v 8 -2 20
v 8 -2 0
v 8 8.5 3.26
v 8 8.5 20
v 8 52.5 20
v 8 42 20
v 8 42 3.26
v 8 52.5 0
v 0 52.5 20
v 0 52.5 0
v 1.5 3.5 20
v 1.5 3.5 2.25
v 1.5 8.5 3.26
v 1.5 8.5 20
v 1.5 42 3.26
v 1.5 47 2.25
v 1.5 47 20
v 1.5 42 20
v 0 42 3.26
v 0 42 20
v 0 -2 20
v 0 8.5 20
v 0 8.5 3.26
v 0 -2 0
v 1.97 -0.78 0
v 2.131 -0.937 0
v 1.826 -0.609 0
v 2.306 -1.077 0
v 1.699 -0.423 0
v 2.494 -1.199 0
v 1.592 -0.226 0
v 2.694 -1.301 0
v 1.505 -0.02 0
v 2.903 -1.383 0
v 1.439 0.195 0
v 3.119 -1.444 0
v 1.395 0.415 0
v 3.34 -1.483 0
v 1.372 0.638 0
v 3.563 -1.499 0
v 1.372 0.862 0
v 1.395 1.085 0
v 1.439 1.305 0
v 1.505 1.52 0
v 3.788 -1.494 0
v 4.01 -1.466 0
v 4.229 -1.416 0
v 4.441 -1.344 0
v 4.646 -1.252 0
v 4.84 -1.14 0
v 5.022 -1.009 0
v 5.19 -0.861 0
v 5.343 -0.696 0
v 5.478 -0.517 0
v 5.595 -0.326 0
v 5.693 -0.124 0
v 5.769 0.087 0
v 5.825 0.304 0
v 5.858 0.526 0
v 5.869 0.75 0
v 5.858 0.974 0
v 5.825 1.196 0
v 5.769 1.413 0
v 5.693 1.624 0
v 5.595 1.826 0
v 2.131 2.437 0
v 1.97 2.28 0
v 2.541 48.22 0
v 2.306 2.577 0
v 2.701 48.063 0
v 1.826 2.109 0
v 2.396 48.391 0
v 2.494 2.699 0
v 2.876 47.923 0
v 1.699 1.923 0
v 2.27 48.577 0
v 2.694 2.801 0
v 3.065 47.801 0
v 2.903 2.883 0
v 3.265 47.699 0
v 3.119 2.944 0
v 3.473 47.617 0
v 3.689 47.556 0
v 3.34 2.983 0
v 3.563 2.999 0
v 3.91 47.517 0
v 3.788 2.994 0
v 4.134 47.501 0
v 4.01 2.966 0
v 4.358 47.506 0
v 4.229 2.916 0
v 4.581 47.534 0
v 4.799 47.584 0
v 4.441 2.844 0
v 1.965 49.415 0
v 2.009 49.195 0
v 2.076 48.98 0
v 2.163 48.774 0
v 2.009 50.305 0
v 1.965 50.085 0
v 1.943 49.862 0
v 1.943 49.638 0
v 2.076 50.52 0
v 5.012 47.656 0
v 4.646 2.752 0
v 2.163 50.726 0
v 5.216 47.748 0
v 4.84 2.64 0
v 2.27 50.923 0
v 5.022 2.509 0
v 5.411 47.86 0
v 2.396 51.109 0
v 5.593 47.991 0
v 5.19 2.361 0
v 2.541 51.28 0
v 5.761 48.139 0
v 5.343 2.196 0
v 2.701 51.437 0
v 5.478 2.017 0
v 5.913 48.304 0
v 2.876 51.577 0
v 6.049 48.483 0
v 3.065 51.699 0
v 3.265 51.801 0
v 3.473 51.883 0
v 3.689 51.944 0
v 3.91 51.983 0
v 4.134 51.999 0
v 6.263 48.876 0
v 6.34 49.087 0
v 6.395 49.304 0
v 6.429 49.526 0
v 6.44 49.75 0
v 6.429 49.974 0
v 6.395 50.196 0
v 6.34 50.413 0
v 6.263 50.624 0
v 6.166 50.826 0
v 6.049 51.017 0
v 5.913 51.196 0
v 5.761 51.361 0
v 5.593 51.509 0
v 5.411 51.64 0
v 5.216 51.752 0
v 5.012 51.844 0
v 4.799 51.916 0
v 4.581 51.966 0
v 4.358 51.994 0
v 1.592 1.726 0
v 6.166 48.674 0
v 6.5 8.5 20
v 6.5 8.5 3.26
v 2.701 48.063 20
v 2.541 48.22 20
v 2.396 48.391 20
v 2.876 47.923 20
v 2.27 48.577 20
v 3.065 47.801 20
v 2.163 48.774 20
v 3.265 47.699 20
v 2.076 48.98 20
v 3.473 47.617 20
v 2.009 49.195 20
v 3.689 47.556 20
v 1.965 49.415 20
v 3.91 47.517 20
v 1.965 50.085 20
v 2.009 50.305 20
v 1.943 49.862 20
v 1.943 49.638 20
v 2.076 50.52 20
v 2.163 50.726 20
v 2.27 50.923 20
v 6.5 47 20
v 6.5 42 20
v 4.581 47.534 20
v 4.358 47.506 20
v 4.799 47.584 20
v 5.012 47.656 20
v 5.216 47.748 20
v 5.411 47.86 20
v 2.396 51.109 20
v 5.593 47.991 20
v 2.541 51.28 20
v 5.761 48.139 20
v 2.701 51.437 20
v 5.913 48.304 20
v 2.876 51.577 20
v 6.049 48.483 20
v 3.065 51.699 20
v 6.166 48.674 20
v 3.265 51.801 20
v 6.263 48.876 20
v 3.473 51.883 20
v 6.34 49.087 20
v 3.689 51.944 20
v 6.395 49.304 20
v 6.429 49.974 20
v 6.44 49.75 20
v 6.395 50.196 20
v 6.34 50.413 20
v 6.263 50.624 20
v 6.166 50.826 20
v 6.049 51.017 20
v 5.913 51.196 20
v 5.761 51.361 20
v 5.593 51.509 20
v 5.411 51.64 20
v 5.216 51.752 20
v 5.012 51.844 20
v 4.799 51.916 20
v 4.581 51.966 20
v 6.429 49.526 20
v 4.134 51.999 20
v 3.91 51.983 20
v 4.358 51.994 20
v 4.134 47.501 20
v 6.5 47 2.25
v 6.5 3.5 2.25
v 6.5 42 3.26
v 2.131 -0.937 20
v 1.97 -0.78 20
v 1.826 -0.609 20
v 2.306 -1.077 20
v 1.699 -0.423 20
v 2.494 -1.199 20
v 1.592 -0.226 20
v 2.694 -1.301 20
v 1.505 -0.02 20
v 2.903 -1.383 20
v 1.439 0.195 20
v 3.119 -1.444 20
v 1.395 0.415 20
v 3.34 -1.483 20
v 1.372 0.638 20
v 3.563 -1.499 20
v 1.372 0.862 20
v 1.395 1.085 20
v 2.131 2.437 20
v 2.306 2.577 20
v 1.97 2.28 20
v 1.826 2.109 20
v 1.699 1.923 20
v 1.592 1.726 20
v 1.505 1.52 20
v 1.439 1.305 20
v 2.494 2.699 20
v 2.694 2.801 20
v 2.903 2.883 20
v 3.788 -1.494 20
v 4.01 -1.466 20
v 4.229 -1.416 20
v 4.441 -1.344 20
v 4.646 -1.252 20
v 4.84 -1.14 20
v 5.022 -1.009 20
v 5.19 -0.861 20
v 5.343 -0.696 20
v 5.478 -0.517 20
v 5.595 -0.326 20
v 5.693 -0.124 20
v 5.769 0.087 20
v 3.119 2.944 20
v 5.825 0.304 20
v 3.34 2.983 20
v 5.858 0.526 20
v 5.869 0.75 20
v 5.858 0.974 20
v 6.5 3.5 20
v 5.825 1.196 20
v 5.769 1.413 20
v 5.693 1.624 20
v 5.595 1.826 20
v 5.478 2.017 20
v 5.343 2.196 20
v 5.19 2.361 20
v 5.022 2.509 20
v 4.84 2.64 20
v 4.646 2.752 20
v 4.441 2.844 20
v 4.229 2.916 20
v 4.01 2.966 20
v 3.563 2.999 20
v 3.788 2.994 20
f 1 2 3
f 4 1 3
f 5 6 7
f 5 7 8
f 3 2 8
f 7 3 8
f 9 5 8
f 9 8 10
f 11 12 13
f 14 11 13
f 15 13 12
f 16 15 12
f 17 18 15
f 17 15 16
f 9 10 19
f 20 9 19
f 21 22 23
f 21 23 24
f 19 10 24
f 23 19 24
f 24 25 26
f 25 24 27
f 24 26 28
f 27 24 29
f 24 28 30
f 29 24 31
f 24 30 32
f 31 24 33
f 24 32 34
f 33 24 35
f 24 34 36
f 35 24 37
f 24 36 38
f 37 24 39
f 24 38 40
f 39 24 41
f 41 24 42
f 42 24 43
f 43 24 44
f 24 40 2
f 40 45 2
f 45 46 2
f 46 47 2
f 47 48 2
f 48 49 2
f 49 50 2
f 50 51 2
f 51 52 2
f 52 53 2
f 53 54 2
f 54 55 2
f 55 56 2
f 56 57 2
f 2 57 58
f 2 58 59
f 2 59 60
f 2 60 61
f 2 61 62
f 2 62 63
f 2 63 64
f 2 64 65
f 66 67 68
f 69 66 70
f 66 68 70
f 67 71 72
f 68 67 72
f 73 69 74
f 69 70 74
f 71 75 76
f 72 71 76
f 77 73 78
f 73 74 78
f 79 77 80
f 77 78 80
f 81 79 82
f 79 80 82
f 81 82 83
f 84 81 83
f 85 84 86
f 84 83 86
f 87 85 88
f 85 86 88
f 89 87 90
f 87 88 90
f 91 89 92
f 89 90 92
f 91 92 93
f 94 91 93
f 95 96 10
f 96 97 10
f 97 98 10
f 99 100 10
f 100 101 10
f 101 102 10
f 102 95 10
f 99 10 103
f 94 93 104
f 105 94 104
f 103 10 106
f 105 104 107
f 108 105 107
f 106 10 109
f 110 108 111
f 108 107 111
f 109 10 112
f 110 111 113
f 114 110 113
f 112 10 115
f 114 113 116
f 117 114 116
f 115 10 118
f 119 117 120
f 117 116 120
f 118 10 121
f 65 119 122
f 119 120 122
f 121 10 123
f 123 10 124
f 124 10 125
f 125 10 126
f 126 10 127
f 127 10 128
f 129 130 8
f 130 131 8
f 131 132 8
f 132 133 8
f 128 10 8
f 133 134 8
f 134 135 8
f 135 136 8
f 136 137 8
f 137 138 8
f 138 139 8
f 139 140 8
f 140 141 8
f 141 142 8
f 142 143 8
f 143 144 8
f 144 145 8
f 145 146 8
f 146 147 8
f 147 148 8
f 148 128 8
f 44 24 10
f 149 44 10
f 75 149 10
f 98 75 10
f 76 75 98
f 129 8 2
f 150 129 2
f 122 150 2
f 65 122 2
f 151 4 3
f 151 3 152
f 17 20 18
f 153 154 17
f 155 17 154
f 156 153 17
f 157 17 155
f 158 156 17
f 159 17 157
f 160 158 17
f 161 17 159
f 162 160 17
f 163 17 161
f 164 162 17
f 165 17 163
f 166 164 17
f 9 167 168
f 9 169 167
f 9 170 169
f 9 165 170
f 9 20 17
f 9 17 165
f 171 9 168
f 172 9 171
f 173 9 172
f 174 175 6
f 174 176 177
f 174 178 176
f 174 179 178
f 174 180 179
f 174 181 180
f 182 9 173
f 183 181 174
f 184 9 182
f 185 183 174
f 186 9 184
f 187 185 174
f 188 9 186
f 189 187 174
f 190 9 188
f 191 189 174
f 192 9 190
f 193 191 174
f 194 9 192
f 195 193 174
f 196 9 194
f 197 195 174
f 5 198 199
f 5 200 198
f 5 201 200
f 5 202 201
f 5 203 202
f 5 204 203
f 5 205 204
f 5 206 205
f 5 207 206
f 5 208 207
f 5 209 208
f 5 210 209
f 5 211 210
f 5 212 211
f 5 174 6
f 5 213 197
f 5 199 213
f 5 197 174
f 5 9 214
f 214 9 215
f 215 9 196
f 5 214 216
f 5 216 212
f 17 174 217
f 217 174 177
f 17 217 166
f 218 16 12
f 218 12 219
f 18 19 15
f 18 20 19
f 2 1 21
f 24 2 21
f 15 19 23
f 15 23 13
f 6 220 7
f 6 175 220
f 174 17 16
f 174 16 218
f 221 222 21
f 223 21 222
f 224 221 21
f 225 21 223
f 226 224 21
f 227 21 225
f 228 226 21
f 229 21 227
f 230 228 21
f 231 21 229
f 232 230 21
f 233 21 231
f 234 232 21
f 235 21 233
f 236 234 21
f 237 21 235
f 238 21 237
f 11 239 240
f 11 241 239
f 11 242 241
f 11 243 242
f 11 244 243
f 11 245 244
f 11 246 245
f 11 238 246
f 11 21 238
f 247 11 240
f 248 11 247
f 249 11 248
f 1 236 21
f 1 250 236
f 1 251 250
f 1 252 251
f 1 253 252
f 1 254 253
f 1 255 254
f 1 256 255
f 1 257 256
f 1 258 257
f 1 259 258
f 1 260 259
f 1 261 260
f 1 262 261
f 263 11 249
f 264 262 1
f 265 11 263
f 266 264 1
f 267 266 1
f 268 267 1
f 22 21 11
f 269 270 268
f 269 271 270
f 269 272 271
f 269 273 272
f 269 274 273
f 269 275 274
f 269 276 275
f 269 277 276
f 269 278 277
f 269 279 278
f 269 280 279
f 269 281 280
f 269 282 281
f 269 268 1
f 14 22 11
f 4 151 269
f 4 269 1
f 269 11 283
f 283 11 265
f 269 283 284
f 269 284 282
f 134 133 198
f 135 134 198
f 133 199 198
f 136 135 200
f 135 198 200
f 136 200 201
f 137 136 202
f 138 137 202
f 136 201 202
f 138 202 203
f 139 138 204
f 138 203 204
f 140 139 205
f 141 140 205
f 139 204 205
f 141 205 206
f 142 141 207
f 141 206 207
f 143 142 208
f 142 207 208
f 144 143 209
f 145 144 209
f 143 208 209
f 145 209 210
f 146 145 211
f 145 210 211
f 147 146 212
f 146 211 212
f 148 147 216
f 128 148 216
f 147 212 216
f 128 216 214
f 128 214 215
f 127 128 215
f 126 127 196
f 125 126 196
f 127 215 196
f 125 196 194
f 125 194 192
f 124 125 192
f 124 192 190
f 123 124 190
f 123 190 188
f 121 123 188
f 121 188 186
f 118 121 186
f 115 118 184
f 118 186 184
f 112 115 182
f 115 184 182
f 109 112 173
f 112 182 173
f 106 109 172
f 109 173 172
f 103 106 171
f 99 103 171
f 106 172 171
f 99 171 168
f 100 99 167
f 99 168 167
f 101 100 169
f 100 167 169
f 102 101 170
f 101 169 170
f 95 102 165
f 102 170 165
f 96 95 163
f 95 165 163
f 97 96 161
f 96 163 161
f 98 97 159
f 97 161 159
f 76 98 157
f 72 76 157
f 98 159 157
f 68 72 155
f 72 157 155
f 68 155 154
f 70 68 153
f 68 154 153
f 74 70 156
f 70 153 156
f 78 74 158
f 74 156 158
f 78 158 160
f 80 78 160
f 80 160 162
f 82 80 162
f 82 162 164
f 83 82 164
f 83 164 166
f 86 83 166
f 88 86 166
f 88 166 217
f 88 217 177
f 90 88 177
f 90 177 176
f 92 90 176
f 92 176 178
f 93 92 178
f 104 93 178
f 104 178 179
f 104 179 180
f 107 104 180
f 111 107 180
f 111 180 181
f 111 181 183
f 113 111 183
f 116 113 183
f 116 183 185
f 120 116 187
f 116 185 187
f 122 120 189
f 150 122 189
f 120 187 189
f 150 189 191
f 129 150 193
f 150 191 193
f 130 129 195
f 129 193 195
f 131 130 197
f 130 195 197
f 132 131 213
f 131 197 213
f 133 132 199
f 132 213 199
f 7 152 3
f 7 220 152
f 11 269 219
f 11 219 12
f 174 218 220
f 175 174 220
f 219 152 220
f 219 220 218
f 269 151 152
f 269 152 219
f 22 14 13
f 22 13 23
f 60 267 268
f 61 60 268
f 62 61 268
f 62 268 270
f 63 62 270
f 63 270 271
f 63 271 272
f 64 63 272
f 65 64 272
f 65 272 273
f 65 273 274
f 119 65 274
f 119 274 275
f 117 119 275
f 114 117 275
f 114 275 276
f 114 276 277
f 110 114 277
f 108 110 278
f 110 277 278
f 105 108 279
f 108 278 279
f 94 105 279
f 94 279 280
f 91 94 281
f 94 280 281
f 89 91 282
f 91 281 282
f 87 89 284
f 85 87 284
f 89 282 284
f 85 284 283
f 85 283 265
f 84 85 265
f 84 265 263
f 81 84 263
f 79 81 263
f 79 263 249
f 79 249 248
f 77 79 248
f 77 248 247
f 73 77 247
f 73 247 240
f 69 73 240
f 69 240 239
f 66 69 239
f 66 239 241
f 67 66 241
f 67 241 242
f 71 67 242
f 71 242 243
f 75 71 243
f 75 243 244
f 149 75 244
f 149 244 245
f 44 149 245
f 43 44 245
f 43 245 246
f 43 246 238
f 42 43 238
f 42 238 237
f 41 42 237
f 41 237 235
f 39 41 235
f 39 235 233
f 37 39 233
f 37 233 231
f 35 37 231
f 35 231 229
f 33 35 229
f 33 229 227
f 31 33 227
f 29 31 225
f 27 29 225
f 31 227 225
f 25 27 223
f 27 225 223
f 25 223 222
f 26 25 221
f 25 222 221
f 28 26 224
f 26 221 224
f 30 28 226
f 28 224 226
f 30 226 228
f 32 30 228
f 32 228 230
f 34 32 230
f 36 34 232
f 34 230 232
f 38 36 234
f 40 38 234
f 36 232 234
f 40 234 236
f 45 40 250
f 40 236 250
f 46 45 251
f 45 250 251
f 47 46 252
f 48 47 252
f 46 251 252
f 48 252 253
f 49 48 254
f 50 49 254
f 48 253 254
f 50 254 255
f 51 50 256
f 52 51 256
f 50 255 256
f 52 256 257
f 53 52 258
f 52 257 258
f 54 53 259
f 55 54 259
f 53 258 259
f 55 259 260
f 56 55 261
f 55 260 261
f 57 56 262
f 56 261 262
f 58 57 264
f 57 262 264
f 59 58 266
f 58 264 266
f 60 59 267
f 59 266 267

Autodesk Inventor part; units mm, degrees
ref_plane "YZ Plane" through (0, 0, 0) normal (1, 0, 0) x (0, 1, 0)
ref_plane "XZ Plane" through (0, 0, 0) normal (0, 1, 0) x (-1, 0, 0)
ref_plane "XY Plane" through (0, 0, 0) normal (0, 0, 1) x (1, 0, 0)
sketch "Sketch1" plane through (0, 0, 0) normal (0, 0, 1) x (1, 0, 0)
  line L0 (0, 0) -> (8, 0)
  line L1 (8, 0) -> (8, 50.5)
  line L2 (8, 50.5) -> (0, 50.5)
  line L3 (0, 50.5) -> (0, 0)
  dimension "d0" = 8
  dimension "d1" = 50.5
extrude "Extrusion1" add sketch "Sketch1" along normal blind 20
sketch "Sketch2" plane through (0, 0, 20) normal (0, 0, 1) x (1, 0, 0)
  line L0 (8, 0) -> (8, 50.5) projected
  line L1 (0, 42) -> (8, 42)
  line L2 (8, 42) -> (8, 8.5)
  line L3 (8, 8.5) -> (0, 8.5)
  line L4 (0, 8.5) -> (0, 42)
  line L5 (8, 50.5) -> (0, 50.5) projected
  line L6 (0, 0) -> (8, 0) projected
  dimension "d4" = 33.5
  dimension "d5" = 8.5
  dimension "d6" = 8.5
extrude "Extrusion2" cut sketch "Sketch2" against normal blind 16.74
sketch "Sketch3" plane through (0, 0, 20) normal (0, 0, 1) x (1, 0, 0)
  line L0 (1.5, 47) -> (6.5, 47)
  line L1 (6.5, 47) -> (6.5, 3.5)
  line L2 (6.5, 3.5) -> (1.5, 3.5)
  line L3 (1.5, 3.5) -> (1.5, 47)
  line L4 (0, 50.5) -> (0, 42) projected
  line L5 (0, 42) -> (8, 42) projected
  line L6 (8, 8.5) -> (0, 8.5) projected
  point P0 (0, 0)
  dimension "d9" = 5
  dimension "d10" = 1.5
  dimension "d11" = 5
  dimension "d12" = 5
extrude "Extrusion3" cut sketch "Sketch3" against normal blind 17.75
sketch "Sketch4" plane through (0, 0, 20) normal (0, 0, 1) x (1, 0, 0)
  line L0 (8, 50.5) -> (0, 50.5) projected
  line L1 (0, 50.5) -> (8, 50.5)
  line L2 (8, 50.5) -> (8, 52.5)
  line L3 (8, 52.5) -> (0, 52.5)
  line L4 (0, 52.5) -> (0, 50.5)
  line L5 (0, 0) -> (8, 0) projected
  line L6 (0, 0) -> (8, 0)
  line L7 (8, 0) -> (8, -2)
  line L8 (8, -2) -> (0, -2)
  line L9 (0, -2) -> (0, 0)
  dimension "d15" = 2
extrude "Extrusion4" add sketch "Sketch4" against normal up to surface (20 mm away)
sketch "Sketch5" plane through (0, 0, 20) normal (0, 0, 1) x (1, 0, 0)
  circle A0 centre (4.1899, 49.75) radius 2.25
  circle A1 centre (3.6194, 0.75) radius 2.25
  line L0 (0, -2) -> (8, -2) projected
  line L1 (6.5, 3.5) -> (1.5, 3.5) projected
  line L2 (1.5, 47) -> (6.5, 47) projected
  point P0 (0, 0)
  dimension "d18" = 5.5
  dimension "d19" = 4.5
  dimension "d20" = 2.75
  dimension "d21" = 2.75
extrude "Extrusion5" cut sketch "Sketch5" against normal up to surface (20 mm away)
properties part number "Stand Lower covet"
